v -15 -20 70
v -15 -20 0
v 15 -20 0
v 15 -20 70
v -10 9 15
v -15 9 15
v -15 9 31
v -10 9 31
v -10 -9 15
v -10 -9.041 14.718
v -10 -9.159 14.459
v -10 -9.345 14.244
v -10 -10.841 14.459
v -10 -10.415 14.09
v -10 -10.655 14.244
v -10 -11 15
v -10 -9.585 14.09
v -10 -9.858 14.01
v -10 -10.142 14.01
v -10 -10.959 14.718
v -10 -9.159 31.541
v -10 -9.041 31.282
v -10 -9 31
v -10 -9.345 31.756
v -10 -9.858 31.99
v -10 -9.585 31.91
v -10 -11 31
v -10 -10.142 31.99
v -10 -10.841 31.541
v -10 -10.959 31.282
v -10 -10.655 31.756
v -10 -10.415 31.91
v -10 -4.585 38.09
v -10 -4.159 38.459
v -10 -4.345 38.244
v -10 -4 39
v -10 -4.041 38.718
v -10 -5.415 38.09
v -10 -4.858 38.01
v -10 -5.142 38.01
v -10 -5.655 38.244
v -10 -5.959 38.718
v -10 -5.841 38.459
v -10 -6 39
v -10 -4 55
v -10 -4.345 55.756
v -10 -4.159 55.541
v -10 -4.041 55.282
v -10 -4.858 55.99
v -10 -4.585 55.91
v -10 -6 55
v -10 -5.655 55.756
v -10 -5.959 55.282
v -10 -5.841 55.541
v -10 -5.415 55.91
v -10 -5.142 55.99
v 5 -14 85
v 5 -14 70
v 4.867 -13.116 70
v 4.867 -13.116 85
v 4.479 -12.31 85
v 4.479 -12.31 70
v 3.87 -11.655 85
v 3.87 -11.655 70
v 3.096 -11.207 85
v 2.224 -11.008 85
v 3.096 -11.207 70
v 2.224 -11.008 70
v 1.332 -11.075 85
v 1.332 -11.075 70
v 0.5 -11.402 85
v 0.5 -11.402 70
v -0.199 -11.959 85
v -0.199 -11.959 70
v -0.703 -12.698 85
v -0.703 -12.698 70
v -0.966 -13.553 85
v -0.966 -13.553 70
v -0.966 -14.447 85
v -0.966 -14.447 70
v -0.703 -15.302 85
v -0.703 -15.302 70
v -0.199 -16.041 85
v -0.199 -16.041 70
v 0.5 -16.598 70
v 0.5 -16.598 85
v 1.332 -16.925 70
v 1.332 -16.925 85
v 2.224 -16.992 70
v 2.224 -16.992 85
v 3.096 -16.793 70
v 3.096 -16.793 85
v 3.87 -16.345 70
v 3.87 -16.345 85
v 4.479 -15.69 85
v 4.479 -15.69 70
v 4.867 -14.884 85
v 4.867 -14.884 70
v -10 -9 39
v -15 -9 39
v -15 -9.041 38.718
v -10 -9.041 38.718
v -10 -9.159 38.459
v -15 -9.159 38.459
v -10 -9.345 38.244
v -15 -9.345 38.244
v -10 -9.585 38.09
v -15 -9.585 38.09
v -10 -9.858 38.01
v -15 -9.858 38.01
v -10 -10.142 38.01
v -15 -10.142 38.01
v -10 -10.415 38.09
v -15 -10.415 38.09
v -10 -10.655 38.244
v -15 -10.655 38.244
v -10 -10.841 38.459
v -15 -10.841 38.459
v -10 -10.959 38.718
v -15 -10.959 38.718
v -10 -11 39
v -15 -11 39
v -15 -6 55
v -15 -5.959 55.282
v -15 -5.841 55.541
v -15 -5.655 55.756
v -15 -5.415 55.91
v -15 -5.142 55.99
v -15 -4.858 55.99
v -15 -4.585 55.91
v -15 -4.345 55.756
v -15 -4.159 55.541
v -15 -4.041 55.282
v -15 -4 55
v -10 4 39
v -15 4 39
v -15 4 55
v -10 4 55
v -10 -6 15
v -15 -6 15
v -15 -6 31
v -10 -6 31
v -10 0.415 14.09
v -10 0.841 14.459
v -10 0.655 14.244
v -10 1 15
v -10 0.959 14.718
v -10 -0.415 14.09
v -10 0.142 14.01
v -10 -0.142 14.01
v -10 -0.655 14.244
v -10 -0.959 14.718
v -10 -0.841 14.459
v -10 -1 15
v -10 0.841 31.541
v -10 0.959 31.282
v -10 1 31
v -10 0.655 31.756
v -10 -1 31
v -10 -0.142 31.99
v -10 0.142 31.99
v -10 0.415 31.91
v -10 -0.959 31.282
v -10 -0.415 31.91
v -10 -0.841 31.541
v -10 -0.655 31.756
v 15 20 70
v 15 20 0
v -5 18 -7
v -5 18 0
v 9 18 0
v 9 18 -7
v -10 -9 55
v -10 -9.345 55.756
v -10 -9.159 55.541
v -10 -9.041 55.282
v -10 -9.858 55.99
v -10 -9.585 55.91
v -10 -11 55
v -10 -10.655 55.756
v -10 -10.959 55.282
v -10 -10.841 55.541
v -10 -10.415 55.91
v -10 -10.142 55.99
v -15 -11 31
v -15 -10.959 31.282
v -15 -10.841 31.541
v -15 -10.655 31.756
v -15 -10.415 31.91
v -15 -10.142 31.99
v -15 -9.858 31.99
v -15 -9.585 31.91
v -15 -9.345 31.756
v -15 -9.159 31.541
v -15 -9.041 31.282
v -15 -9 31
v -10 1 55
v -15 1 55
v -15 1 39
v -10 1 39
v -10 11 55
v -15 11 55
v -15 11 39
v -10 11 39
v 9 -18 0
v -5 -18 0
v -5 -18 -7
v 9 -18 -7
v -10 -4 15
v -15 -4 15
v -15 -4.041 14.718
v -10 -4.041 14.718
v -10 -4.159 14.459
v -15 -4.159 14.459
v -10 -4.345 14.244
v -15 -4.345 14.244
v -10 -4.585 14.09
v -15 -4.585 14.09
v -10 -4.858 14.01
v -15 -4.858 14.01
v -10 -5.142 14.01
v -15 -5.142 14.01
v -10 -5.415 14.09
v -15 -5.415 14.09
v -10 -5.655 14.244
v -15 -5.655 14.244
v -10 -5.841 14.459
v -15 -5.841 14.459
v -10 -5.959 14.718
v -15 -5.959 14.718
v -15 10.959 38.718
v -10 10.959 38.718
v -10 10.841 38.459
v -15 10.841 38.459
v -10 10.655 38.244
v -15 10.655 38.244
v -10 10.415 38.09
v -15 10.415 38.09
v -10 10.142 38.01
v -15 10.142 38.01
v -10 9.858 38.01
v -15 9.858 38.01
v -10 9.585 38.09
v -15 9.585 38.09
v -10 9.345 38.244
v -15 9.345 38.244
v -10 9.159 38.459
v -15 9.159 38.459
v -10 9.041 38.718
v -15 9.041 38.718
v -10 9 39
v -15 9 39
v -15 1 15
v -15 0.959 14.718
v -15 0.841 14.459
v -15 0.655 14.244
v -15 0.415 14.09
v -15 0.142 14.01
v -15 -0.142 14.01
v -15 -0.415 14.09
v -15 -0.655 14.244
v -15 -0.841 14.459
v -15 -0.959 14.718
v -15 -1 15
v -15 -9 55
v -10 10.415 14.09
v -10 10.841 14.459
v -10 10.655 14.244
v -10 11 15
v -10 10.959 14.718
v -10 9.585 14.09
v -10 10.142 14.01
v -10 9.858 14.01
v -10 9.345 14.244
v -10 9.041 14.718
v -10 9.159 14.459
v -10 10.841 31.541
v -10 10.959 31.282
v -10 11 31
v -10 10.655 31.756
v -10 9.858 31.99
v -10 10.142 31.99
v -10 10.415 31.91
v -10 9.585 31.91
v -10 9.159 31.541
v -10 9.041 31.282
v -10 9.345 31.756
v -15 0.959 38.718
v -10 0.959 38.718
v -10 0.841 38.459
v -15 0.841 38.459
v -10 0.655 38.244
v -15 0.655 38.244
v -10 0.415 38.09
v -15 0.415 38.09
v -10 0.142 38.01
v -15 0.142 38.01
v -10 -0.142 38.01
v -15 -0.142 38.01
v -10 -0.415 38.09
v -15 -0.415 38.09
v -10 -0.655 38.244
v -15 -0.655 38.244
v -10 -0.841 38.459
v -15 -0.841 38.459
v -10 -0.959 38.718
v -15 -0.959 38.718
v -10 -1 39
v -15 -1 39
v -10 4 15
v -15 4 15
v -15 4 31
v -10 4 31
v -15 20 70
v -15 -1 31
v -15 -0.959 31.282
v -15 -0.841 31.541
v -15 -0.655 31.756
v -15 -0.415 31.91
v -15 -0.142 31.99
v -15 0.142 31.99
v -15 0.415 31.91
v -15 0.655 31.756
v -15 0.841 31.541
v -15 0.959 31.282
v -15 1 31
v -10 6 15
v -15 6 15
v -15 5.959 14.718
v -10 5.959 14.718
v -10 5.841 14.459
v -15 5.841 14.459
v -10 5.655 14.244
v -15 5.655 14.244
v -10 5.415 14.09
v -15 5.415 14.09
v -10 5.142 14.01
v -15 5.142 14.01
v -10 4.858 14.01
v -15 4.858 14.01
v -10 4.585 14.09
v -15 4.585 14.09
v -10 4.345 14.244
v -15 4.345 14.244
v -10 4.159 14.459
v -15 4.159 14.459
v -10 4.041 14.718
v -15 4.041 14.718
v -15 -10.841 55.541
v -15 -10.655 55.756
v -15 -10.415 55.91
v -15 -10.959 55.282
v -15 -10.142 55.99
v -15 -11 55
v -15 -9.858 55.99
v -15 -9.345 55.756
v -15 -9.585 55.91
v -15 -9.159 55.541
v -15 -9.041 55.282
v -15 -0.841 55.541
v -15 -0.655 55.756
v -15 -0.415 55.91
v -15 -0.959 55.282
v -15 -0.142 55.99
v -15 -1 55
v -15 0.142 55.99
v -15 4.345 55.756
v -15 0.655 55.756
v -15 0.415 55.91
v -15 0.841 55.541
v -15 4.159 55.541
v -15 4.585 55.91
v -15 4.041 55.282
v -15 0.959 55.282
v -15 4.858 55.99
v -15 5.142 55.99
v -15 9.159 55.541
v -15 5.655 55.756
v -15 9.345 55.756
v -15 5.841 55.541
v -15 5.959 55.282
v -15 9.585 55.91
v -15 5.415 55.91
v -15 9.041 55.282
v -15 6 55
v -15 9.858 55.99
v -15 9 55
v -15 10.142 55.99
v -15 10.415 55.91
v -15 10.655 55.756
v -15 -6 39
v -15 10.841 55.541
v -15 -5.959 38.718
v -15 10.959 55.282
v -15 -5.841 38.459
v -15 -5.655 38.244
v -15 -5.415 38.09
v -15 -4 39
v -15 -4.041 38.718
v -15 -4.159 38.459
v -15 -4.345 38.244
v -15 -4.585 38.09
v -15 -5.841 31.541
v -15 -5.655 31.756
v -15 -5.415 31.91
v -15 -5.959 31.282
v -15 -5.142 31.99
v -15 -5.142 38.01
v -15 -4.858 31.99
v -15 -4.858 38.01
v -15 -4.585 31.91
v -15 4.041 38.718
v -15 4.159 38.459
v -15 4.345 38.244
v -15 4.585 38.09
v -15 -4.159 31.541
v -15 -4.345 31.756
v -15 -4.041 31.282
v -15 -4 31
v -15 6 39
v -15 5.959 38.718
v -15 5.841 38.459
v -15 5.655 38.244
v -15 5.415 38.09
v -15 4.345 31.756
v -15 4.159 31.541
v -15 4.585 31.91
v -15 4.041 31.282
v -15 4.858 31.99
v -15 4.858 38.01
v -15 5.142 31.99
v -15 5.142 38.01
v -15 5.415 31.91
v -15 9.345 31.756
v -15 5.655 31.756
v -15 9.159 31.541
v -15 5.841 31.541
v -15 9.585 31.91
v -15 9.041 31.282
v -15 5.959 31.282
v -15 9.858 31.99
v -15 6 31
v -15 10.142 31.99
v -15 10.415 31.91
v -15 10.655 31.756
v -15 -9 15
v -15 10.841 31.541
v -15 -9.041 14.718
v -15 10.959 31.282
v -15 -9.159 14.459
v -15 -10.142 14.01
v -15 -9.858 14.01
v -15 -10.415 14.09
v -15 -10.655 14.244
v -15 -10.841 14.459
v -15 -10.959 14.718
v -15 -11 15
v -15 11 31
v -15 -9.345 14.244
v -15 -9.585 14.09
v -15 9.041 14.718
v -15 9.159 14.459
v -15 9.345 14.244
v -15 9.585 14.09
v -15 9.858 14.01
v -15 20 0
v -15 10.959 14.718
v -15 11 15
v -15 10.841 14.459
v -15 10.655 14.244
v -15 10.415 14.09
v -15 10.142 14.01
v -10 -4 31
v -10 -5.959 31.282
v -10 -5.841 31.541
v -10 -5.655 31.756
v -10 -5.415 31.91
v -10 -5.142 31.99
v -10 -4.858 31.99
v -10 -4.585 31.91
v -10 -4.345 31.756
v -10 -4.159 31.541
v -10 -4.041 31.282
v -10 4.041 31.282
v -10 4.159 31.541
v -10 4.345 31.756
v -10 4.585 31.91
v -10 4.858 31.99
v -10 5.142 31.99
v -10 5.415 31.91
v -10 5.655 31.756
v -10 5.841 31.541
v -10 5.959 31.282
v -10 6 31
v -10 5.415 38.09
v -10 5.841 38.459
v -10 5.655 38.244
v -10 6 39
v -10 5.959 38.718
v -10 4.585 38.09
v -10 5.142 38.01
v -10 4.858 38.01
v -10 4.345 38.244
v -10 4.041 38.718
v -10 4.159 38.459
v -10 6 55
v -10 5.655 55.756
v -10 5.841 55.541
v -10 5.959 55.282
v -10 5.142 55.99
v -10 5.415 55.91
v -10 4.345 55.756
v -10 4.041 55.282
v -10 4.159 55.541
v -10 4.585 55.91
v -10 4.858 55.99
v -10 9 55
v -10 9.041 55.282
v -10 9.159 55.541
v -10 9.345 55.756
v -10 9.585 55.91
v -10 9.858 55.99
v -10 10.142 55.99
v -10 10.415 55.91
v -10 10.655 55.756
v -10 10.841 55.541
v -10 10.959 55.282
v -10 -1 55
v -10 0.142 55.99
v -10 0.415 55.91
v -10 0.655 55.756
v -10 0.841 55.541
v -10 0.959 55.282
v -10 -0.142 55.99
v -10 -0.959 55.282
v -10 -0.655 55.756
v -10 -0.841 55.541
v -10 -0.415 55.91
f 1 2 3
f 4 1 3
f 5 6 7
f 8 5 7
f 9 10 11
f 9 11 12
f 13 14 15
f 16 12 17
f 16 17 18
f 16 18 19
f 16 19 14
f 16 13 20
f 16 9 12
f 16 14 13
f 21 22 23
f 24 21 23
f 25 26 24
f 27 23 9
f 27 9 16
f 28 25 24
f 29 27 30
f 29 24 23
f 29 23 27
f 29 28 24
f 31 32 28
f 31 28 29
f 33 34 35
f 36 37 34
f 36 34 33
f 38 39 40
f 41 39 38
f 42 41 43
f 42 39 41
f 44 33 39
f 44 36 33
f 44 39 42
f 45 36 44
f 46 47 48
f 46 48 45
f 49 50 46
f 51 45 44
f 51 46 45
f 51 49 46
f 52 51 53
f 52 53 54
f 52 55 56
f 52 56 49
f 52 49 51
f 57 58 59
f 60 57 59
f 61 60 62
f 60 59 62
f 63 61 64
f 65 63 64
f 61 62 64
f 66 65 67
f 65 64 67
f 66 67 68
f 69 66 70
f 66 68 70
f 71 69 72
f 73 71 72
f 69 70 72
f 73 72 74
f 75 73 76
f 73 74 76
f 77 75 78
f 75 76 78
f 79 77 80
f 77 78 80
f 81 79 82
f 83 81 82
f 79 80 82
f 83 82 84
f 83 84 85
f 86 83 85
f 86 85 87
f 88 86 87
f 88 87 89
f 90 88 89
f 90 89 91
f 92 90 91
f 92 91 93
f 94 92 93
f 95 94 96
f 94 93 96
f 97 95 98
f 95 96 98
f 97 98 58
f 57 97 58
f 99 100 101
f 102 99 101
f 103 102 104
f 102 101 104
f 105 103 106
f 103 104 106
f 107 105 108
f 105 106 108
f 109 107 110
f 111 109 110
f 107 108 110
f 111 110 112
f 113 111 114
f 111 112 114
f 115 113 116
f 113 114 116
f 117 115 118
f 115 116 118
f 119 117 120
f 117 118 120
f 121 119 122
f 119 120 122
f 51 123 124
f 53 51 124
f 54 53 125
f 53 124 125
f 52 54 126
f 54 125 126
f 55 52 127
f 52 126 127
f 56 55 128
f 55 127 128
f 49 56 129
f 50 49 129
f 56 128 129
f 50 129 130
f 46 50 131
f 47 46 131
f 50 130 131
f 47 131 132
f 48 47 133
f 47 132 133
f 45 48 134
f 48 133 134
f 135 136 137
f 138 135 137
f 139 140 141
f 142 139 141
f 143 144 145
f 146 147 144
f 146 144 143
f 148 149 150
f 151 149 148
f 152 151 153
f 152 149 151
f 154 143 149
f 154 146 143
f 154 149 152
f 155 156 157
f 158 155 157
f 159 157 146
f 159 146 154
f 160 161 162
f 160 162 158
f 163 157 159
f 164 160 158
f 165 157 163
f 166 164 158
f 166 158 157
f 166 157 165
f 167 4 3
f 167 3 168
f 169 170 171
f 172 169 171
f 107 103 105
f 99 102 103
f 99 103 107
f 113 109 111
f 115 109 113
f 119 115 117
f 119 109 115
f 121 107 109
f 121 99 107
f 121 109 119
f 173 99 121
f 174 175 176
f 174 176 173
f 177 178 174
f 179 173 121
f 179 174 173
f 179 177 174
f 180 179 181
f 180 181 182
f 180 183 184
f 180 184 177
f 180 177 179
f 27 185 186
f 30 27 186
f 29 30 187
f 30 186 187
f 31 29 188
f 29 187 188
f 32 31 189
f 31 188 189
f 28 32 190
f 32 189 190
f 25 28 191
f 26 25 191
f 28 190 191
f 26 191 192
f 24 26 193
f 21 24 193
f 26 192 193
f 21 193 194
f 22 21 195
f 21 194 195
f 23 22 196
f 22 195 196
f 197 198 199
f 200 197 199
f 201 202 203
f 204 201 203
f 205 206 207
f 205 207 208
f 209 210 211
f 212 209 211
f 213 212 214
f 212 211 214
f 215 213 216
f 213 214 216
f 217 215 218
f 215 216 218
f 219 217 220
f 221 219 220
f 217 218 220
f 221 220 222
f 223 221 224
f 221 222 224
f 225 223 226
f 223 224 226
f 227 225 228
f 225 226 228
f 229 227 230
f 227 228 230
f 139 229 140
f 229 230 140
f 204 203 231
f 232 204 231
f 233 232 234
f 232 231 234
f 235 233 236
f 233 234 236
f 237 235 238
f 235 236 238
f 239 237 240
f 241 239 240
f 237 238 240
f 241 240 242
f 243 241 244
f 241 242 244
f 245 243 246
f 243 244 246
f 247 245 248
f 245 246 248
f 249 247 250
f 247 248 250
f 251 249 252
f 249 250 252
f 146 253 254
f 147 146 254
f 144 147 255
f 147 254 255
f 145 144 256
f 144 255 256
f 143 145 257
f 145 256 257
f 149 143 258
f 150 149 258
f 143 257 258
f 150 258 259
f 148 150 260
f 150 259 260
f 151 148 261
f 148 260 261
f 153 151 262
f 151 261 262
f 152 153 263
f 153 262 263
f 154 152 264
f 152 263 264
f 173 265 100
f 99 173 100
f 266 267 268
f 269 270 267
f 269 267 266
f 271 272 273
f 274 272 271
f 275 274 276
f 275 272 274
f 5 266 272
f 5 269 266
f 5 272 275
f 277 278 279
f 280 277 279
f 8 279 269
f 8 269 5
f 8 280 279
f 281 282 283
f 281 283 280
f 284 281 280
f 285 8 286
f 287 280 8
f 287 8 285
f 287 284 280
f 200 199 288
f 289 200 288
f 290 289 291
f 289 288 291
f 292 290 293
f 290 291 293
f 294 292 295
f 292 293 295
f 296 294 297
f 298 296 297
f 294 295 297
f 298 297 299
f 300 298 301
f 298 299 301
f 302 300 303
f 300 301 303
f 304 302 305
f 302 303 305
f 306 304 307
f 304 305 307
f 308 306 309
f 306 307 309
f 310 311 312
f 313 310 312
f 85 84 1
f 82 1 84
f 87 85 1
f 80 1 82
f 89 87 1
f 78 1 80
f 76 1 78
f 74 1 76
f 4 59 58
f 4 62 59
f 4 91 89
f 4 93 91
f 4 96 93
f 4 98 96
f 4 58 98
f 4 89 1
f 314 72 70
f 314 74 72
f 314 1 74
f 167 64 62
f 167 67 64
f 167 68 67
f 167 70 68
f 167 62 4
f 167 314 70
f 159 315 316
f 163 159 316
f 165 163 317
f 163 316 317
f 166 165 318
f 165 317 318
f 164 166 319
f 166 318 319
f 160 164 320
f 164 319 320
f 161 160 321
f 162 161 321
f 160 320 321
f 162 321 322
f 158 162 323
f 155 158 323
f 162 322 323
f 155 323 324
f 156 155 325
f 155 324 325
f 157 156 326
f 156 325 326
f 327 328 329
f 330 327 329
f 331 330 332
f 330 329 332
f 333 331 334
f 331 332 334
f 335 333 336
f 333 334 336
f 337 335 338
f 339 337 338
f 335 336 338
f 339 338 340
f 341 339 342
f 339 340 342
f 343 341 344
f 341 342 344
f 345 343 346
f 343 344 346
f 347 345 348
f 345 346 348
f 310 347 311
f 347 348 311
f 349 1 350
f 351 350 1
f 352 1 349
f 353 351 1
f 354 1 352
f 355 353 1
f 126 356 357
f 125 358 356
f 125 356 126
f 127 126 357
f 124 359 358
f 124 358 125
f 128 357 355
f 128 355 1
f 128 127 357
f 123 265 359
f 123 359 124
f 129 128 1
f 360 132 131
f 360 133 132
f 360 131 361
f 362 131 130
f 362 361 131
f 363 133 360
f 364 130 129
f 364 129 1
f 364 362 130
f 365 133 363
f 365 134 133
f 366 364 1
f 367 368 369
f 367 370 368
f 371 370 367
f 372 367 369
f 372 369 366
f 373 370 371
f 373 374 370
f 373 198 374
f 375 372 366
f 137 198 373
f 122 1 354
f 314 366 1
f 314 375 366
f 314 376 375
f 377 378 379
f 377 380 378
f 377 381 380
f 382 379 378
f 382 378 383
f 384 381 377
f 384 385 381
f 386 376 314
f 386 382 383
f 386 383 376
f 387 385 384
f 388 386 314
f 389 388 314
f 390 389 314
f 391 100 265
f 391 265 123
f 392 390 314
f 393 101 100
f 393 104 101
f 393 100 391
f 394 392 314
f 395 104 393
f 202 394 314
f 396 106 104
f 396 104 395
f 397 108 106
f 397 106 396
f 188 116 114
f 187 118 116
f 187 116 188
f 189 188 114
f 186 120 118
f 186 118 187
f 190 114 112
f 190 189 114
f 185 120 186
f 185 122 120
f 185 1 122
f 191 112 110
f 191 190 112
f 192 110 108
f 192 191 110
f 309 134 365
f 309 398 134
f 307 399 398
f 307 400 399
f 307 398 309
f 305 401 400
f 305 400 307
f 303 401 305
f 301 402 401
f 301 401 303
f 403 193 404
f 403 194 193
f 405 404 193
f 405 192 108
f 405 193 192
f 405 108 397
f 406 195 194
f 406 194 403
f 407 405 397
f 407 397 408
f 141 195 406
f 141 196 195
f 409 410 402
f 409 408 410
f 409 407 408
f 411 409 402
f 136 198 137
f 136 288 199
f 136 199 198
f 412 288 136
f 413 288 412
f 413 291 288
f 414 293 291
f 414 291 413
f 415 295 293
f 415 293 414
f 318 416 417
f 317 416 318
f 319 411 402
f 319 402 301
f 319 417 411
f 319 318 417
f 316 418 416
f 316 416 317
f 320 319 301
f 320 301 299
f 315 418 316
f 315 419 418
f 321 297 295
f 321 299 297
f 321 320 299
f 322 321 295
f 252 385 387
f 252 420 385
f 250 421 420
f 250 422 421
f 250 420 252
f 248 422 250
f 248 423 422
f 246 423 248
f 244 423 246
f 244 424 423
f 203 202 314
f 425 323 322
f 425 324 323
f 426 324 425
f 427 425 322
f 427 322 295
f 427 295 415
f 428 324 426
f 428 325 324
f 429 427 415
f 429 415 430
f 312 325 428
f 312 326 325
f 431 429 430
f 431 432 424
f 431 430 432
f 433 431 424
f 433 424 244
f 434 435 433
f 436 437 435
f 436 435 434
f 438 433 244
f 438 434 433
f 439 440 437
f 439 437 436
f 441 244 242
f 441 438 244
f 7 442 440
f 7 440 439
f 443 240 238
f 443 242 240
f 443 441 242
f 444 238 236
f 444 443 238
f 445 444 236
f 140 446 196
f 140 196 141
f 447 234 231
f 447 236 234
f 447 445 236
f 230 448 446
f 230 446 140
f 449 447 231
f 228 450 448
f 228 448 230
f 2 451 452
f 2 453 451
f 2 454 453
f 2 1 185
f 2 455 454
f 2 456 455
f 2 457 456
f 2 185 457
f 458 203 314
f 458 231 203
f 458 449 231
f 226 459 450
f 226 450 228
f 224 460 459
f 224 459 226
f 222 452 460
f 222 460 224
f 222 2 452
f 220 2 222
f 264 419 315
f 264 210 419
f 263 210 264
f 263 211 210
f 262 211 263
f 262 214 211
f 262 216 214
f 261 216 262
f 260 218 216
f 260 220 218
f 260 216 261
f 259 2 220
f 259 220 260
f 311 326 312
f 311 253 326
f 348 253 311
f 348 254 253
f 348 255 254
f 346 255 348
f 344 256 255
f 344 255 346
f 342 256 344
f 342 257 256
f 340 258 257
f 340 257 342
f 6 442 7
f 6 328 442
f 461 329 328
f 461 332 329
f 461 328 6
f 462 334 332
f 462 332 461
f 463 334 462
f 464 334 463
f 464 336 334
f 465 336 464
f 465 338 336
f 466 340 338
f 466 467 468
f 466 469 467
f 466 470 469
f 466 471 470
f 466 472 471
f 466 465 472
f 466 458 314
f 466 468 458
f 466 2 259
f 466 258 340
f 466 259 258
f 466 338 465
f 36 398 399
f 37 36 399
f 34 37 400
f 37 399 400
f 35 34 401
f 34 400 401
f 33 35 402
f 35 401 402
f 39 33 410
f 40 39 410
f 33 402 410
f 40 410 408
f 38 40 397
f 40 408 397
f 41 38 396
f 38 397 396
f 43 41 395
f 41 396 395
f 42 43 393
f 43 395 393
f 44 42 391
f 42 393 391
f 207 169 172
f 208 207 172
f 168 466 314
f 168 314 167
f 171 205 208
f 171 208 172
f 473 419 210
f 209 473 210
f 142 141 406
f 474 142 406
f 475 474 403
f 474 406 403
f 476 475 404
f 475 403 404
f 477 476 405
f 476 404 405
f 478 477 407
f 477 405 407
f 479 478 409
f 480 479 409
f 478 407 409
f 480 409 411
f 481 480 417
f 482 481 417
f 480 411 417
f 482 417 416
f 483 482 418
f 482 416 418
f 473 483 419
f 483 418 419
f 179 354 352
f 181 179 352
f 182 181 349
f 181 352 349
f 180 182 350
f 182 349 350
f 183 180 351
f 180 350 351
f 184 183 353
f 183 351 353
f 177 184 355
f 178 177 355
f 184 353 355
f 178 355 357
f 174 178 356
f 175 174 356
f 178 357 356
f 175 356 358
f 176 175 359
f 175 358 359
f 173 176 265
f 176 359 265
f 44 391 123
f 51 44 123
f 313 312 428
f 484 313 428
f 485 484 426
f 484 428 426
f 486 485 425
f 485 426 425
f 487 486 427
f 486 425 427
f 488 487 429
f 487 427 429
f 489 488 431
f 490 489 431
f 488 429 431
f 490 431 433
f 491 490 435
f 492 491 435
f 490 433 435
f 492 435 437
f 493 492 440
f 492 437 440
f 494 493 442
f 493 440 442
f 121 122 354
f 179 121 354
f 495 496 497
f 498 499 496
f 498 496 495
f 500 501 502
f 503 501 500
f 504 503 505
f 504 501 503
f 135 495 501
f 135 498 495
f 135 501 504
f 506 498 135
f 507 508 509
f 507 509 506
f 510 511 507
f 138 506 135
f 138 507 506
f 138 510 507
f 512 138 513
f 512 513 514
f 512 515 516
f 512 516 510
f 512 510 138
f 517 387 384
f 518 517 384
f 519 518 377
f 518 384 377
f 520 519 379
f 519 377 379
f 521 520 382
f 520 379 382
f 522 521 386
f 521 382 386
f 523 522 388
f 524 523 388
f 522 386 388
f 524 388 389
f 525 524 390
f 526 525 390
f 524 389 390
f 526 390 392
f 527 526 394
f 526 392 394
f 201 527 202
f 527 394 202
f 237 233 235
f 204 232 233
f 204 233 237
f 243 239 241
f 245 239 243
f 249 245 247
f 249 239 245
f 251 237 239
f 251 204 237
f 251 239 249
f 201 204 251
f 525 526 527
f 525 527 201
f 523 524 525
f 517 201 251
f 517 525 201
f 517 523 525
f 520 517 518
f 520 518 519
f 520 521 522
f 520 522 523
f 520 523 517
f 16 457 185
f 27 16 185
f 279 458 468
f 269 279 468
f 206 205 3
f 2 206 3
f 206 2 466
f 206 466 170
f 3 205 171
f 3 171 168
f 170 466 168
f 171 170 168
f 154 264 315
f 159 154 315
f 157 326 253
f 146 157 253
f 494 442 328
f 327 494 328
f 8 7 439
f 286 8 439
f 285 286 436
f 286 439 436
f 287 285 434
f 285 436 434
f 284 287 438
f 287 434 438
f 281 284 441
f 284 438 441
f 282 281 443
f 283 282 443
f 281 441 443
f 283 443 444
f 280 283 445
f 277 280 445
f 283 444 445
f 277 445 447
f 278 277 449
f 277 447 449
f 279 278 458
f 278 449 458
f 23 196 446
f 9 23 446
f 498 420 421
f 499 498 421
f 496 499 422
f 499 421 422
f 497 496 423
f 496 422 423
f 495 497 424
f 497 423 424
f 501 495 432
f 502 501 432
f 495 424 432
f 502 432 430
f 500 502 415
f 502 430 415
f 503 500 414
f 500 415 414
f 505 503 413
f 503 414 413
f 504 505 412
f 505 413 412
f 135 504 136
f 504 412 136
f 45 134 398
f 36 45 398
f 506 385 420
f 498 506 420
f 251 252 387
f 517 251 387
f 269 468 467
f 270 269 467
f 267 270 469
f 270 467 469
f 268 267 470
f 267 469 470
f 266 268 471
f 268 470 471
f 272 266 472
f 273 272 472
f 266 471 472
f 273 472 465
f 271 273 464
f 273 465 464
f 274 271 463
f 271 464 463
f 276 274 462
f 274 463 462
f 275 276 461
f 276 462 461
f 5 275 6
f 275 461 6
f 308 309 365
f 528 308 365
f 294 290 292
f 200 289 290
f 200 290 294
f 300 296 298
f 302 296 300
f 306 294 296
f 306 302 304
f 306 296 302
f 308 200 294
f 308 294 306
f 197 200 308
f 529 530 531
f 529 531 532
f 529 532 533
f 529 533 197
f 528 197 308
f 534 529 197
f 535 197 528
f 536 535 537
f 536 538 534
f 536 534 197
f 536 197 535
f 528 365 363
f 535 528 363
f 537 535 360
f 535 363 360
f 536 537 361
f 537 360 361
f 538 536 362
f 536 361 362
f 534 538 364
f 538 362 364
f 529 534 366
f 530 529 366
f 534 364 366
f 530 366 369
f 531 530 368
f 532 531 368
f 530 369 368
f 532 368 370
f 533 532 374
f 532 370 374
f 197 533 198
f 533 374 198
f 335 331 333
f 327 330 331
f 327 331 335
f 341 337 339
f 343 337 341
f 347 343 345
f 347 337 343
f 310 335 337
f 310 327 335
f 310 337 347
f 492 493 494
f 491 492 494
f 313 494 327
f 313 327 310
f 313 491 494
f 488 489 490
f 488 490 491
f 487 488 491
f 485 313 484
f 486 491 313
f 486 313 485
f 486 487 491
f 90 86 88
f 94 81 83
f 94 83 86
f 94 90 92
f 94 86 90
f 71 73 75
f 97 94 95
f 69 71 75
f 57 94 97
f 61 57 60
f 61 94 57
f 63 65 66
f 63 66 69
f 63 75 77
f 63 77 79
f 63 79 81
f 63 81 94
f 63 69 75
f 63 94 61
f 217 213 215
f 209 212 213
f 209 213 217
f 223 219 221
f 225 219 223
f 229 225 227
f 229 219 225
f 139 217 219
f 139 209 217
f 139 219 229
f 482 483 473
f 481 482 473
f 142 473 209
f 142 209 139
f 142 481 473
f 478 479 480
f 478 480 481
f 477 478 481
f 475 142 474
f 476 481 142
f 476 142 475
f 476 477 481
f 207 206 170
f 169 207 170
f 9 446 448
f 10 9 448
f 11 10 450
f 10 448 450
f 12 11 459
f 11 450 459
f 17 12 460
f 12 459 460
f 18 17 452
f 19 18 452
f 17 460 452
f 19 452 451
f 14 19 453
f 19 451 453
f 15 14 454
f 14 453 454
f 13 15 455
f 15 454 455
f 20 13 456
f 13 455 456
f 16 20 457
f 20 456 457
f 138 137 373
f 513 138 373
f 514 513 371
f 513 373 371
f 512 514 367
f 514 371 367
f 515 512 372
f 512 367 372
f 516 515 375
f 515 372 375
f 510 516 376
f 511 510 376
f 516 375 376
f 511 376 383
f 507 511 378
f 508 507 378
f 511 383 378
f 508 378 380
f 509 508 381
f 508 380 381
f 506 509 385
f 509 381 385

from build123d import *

# Parameters (mm, degrees)
F0_W     = 30
F0_H     = 40
F0_W_2   = 14
F0_H_2   = 36
F1_DEPTH = 70
F2_DEPTH = 7
F3_R     = 3
F4_DEPTH = 15
F6_DEPTH = 5


with BuildPart() as f1:
    # F0 (on Top) → F1 (new body)
    with BuildSketch(Plane.XY):
        Rectangle(F0_W, F0_H)
        with Locations((2, 0)):
            Rectangle(F0_W_2, F0_H_2, mode=Mode.SUBTRACT)
        with Locations((2, 0)):
            Rectangle(F0_W_2, F0_H_2)
    extrude(amount=F1_DEPTH)

    # F0 (on Top) → F2 (join)
    with BuildSketch(Plane.XY):
        with Locations((2, 0)):
            Rectangle(F0_W_2, F0_H_2)
    extrude(amount=-F2_DEPTH)

    # F3 (on face) → F4 (join)
    with BuildSketch(Plane.XY.offset(70)):
        with Locations((2, -14)):
            Circle(F3_R)
    extrude(amount=F4_DEPTH)

    # F5 (on face) → F6 (cut)
    with BuildSketch(Plane(origin=(-15, 0, 0), x_dir=(0, -1, 0), z_dir=(-1, 0, 0))):
        with BuildLine():
            ThreePointArc((9, 15), (10, 14), (11, 15))
            ThreePointArc((11, 15), (10, 16), (9, 15))
        make_face()
        with BuildLine():
            ThreePointArc((9, 15), (10, 16), (11, 15))
            Line((11, 15), (11, 31))
            ThreePointArc((11, 31), (10, 30), (9, 31))
            Line((9, 31), (9, 15))
        make_face()
        with BuildLine():
            ThreePointArc((9, 31), (10, 30), (11, 31))
            ThreePointArc((11, 31), (10, 32), (9, 31))
        make_face()
        with BuildLine():
            ThreePointArc((9, 55), (10, 54), (11, 55))
            ThreePointArc((11, 55), (10, 56), (9, 55))
        make_face()
        with BuildLine():
            ThreePointArc((4, 55), (5, 54), (6, 55))
            ThreePointArc((6, 55), (5, 56), (4, 55))
        make_face()
        with BuildLine():
            ThreePointArc((-1, 55), (0, 54), (1, 55))
            ThreePointArc((1, 55), (0, 56), (-1, 55))
        make_face()
        with BuildLine():
            ThreePointArc((-6, 55), (-5, 54), (-4, 55))
            ThreePointArc((-4, 55), (-5, 56), (-6, 55))
        make_face()
        with BuildLine():
            ThreePointArc((-11, 55), (-10, 54), (-9, 55))
            ThreePointArc((-9, 55), (-10, 56), (-11, 55))
        make_face()
        with BuildLine():
            ThreePointArc((9, 39), (10, 40), (11, 39))
            Line((11, 39), (11, 55))
            ThreePointArc((11, 55), (10, 54), (9, 55))
            Line((9, 55), (9, 39))
        make_face()
        with BuildLine():
            ThreePointArc((4, 39), (5, 40), (6, 39))
            Line((6, 39), (6, 55))
            ThreePointArc((6, 55), (5, 54), (4, 55))
            Line((4, 55), (4, 39))
        make_face()
        with BuildLine():
            ThreePointArc((-1, 39), (0, 40), (1, 39))
            Line((1, 39), (1, 55))
            ThreePointArc((1, 55), (0, 54), (-1, 55))
            Line((-1, 55), (-1, 39))
        make_face()
        with BuildLine():
            ThreePointArc((-6, 39), (-5, 40), (-4, 39))
            Line((-4, 39), (-4, 55))
            ThreePointArc((-4, 55), (-5, 54), (-6, 55))
            Line((-6, 55), (-6, 39))
        make_face()
        with BuildLine():
            ThreePointArc((-11, 39), (-10, 40), (-9, 39))
            Line((-9, 39), (-9, 55))
            ThreePointArc((-9, 55), (-10, 54), (-11, 55))
            Line((-11, 55), (-11, 39))
        make_face()
        with BuildLine():
            ThreePointArc((9, 39), (10, 38), (11, 39))
            ThreePointArc((11, 39), (10, 40), (9, 39))
        make_face()
        with BuildLine():
            ThreePointArc((4, 39), (5, 38), (6, 39))
            ThreePointArc((6, 39), (5, 40), (4, 39))
        make_face()
        with BuildLine():
            ThreePointArc((-1, 39), (0, 38), (1, 39))
            ThreePointArc((1, 39), (0, 40), (-1, 39))
        make_face()
        with BuildLine():
            ThreePointArc((-6, 39), (-5, 38), (-4, 39))
            ThreePointArc((-4, 39), (-5, 40), (-6, 39))
        make_face()
        with BuildLine():
            ThreePointArc((-11, 39), (-10, 38), (-9, 39))
            ThreePointArc((-9, 39), (-10, 40), (-11, 39))
        make_face()
        with BuildLine():
            ThreePointArc((4, 31), (5, 30), (6, 31))
            ThreePointArc((6, 31), (5, 32), (4, 31))
        make_face()
        with BuildLine():
            ThreePointArc((-1, 31), (0, 30), (1, 31))
            ThreePointArc((1, 31), (0, 32), (-1, 31))
        make_face()
        with BuildLine():
            ThreePointArc((-6, 31), (-5, 30), (-4, 31))
            ThreePointArc((-4, 31), (-5, 32), (-6, 31))
        make_face()
        with BuildLine():
            ThreePointArc((-11, 31), (-10, 30), (-9, 31))
            ThreePointArc((-9, 31), (-10, 32), (-11, 31))
        make_face()
        with BuildLine():
            ThreePointArc((4, 15), (5, 16), (6, 15))
            Line((6, 15), (6, 31))
            ThreePointArc((6, 31), (5, 30), (4, 31))
            Line((4, 31), (4, 15))
        make_face()
        with BuildLine():
            ThreePointArc((-1, 15), (0, 16), (1, 15))
            Line((1, 15), (1, 31))
            ThreePointArc((1, 31), (0, 30), (-1, 31))
            Line((-1, 31), (-1, 15))
        make_face()
        with BuildLine():
            ThreePointArc((-6, 15), (-5, 16), (-4, 15))
            Line((-4, 15), (-4, 31))
            ThreePointArc((-4, 31), (-5, 30), (-6, 31))
            Line((-6, 31), (-6, 15))
        make_face()
        with BuildLine():
            ThreePointArc((-11, 15), (-10, 16), (-9, 15))
            Line((-9, 15), (-9, 31))
            ThreePointArc((-9, 31), (-10, 30), (-11, 31))
            Line((-11, 31), (-11, 15))
        make_face()
        with BuildLine():
            ThreePointArc((4, 15), (5, 14), (6, 15))
            ThreePointArc((6, 15), (5, 16), (4, 15))
        make_face()
        with BuildLine():
            ThreePointArc((-1, 15), (0, 14), (1, 15))
            ThreePointArc((1, 15), (0, 16), (-1, 15))
        make_face()
        with BuildLine():
            ThreePointArc((-6, 15), (-5, 14), (-4, 15))
            ThreePointArc((-4, 15), (-5, 16), (-6, 15))
        make_face()
        with BuildLine():
            ThreePointArc((-11, 15), (-10, 14), (-9, 15))
            ThreePointArc((-9, 15), (-10, 16), (-11, 15))
        make_face()
    extrude(amount=-F6_DEPTH, mode=Mode.SUBTRACT)


solid = f1.part
